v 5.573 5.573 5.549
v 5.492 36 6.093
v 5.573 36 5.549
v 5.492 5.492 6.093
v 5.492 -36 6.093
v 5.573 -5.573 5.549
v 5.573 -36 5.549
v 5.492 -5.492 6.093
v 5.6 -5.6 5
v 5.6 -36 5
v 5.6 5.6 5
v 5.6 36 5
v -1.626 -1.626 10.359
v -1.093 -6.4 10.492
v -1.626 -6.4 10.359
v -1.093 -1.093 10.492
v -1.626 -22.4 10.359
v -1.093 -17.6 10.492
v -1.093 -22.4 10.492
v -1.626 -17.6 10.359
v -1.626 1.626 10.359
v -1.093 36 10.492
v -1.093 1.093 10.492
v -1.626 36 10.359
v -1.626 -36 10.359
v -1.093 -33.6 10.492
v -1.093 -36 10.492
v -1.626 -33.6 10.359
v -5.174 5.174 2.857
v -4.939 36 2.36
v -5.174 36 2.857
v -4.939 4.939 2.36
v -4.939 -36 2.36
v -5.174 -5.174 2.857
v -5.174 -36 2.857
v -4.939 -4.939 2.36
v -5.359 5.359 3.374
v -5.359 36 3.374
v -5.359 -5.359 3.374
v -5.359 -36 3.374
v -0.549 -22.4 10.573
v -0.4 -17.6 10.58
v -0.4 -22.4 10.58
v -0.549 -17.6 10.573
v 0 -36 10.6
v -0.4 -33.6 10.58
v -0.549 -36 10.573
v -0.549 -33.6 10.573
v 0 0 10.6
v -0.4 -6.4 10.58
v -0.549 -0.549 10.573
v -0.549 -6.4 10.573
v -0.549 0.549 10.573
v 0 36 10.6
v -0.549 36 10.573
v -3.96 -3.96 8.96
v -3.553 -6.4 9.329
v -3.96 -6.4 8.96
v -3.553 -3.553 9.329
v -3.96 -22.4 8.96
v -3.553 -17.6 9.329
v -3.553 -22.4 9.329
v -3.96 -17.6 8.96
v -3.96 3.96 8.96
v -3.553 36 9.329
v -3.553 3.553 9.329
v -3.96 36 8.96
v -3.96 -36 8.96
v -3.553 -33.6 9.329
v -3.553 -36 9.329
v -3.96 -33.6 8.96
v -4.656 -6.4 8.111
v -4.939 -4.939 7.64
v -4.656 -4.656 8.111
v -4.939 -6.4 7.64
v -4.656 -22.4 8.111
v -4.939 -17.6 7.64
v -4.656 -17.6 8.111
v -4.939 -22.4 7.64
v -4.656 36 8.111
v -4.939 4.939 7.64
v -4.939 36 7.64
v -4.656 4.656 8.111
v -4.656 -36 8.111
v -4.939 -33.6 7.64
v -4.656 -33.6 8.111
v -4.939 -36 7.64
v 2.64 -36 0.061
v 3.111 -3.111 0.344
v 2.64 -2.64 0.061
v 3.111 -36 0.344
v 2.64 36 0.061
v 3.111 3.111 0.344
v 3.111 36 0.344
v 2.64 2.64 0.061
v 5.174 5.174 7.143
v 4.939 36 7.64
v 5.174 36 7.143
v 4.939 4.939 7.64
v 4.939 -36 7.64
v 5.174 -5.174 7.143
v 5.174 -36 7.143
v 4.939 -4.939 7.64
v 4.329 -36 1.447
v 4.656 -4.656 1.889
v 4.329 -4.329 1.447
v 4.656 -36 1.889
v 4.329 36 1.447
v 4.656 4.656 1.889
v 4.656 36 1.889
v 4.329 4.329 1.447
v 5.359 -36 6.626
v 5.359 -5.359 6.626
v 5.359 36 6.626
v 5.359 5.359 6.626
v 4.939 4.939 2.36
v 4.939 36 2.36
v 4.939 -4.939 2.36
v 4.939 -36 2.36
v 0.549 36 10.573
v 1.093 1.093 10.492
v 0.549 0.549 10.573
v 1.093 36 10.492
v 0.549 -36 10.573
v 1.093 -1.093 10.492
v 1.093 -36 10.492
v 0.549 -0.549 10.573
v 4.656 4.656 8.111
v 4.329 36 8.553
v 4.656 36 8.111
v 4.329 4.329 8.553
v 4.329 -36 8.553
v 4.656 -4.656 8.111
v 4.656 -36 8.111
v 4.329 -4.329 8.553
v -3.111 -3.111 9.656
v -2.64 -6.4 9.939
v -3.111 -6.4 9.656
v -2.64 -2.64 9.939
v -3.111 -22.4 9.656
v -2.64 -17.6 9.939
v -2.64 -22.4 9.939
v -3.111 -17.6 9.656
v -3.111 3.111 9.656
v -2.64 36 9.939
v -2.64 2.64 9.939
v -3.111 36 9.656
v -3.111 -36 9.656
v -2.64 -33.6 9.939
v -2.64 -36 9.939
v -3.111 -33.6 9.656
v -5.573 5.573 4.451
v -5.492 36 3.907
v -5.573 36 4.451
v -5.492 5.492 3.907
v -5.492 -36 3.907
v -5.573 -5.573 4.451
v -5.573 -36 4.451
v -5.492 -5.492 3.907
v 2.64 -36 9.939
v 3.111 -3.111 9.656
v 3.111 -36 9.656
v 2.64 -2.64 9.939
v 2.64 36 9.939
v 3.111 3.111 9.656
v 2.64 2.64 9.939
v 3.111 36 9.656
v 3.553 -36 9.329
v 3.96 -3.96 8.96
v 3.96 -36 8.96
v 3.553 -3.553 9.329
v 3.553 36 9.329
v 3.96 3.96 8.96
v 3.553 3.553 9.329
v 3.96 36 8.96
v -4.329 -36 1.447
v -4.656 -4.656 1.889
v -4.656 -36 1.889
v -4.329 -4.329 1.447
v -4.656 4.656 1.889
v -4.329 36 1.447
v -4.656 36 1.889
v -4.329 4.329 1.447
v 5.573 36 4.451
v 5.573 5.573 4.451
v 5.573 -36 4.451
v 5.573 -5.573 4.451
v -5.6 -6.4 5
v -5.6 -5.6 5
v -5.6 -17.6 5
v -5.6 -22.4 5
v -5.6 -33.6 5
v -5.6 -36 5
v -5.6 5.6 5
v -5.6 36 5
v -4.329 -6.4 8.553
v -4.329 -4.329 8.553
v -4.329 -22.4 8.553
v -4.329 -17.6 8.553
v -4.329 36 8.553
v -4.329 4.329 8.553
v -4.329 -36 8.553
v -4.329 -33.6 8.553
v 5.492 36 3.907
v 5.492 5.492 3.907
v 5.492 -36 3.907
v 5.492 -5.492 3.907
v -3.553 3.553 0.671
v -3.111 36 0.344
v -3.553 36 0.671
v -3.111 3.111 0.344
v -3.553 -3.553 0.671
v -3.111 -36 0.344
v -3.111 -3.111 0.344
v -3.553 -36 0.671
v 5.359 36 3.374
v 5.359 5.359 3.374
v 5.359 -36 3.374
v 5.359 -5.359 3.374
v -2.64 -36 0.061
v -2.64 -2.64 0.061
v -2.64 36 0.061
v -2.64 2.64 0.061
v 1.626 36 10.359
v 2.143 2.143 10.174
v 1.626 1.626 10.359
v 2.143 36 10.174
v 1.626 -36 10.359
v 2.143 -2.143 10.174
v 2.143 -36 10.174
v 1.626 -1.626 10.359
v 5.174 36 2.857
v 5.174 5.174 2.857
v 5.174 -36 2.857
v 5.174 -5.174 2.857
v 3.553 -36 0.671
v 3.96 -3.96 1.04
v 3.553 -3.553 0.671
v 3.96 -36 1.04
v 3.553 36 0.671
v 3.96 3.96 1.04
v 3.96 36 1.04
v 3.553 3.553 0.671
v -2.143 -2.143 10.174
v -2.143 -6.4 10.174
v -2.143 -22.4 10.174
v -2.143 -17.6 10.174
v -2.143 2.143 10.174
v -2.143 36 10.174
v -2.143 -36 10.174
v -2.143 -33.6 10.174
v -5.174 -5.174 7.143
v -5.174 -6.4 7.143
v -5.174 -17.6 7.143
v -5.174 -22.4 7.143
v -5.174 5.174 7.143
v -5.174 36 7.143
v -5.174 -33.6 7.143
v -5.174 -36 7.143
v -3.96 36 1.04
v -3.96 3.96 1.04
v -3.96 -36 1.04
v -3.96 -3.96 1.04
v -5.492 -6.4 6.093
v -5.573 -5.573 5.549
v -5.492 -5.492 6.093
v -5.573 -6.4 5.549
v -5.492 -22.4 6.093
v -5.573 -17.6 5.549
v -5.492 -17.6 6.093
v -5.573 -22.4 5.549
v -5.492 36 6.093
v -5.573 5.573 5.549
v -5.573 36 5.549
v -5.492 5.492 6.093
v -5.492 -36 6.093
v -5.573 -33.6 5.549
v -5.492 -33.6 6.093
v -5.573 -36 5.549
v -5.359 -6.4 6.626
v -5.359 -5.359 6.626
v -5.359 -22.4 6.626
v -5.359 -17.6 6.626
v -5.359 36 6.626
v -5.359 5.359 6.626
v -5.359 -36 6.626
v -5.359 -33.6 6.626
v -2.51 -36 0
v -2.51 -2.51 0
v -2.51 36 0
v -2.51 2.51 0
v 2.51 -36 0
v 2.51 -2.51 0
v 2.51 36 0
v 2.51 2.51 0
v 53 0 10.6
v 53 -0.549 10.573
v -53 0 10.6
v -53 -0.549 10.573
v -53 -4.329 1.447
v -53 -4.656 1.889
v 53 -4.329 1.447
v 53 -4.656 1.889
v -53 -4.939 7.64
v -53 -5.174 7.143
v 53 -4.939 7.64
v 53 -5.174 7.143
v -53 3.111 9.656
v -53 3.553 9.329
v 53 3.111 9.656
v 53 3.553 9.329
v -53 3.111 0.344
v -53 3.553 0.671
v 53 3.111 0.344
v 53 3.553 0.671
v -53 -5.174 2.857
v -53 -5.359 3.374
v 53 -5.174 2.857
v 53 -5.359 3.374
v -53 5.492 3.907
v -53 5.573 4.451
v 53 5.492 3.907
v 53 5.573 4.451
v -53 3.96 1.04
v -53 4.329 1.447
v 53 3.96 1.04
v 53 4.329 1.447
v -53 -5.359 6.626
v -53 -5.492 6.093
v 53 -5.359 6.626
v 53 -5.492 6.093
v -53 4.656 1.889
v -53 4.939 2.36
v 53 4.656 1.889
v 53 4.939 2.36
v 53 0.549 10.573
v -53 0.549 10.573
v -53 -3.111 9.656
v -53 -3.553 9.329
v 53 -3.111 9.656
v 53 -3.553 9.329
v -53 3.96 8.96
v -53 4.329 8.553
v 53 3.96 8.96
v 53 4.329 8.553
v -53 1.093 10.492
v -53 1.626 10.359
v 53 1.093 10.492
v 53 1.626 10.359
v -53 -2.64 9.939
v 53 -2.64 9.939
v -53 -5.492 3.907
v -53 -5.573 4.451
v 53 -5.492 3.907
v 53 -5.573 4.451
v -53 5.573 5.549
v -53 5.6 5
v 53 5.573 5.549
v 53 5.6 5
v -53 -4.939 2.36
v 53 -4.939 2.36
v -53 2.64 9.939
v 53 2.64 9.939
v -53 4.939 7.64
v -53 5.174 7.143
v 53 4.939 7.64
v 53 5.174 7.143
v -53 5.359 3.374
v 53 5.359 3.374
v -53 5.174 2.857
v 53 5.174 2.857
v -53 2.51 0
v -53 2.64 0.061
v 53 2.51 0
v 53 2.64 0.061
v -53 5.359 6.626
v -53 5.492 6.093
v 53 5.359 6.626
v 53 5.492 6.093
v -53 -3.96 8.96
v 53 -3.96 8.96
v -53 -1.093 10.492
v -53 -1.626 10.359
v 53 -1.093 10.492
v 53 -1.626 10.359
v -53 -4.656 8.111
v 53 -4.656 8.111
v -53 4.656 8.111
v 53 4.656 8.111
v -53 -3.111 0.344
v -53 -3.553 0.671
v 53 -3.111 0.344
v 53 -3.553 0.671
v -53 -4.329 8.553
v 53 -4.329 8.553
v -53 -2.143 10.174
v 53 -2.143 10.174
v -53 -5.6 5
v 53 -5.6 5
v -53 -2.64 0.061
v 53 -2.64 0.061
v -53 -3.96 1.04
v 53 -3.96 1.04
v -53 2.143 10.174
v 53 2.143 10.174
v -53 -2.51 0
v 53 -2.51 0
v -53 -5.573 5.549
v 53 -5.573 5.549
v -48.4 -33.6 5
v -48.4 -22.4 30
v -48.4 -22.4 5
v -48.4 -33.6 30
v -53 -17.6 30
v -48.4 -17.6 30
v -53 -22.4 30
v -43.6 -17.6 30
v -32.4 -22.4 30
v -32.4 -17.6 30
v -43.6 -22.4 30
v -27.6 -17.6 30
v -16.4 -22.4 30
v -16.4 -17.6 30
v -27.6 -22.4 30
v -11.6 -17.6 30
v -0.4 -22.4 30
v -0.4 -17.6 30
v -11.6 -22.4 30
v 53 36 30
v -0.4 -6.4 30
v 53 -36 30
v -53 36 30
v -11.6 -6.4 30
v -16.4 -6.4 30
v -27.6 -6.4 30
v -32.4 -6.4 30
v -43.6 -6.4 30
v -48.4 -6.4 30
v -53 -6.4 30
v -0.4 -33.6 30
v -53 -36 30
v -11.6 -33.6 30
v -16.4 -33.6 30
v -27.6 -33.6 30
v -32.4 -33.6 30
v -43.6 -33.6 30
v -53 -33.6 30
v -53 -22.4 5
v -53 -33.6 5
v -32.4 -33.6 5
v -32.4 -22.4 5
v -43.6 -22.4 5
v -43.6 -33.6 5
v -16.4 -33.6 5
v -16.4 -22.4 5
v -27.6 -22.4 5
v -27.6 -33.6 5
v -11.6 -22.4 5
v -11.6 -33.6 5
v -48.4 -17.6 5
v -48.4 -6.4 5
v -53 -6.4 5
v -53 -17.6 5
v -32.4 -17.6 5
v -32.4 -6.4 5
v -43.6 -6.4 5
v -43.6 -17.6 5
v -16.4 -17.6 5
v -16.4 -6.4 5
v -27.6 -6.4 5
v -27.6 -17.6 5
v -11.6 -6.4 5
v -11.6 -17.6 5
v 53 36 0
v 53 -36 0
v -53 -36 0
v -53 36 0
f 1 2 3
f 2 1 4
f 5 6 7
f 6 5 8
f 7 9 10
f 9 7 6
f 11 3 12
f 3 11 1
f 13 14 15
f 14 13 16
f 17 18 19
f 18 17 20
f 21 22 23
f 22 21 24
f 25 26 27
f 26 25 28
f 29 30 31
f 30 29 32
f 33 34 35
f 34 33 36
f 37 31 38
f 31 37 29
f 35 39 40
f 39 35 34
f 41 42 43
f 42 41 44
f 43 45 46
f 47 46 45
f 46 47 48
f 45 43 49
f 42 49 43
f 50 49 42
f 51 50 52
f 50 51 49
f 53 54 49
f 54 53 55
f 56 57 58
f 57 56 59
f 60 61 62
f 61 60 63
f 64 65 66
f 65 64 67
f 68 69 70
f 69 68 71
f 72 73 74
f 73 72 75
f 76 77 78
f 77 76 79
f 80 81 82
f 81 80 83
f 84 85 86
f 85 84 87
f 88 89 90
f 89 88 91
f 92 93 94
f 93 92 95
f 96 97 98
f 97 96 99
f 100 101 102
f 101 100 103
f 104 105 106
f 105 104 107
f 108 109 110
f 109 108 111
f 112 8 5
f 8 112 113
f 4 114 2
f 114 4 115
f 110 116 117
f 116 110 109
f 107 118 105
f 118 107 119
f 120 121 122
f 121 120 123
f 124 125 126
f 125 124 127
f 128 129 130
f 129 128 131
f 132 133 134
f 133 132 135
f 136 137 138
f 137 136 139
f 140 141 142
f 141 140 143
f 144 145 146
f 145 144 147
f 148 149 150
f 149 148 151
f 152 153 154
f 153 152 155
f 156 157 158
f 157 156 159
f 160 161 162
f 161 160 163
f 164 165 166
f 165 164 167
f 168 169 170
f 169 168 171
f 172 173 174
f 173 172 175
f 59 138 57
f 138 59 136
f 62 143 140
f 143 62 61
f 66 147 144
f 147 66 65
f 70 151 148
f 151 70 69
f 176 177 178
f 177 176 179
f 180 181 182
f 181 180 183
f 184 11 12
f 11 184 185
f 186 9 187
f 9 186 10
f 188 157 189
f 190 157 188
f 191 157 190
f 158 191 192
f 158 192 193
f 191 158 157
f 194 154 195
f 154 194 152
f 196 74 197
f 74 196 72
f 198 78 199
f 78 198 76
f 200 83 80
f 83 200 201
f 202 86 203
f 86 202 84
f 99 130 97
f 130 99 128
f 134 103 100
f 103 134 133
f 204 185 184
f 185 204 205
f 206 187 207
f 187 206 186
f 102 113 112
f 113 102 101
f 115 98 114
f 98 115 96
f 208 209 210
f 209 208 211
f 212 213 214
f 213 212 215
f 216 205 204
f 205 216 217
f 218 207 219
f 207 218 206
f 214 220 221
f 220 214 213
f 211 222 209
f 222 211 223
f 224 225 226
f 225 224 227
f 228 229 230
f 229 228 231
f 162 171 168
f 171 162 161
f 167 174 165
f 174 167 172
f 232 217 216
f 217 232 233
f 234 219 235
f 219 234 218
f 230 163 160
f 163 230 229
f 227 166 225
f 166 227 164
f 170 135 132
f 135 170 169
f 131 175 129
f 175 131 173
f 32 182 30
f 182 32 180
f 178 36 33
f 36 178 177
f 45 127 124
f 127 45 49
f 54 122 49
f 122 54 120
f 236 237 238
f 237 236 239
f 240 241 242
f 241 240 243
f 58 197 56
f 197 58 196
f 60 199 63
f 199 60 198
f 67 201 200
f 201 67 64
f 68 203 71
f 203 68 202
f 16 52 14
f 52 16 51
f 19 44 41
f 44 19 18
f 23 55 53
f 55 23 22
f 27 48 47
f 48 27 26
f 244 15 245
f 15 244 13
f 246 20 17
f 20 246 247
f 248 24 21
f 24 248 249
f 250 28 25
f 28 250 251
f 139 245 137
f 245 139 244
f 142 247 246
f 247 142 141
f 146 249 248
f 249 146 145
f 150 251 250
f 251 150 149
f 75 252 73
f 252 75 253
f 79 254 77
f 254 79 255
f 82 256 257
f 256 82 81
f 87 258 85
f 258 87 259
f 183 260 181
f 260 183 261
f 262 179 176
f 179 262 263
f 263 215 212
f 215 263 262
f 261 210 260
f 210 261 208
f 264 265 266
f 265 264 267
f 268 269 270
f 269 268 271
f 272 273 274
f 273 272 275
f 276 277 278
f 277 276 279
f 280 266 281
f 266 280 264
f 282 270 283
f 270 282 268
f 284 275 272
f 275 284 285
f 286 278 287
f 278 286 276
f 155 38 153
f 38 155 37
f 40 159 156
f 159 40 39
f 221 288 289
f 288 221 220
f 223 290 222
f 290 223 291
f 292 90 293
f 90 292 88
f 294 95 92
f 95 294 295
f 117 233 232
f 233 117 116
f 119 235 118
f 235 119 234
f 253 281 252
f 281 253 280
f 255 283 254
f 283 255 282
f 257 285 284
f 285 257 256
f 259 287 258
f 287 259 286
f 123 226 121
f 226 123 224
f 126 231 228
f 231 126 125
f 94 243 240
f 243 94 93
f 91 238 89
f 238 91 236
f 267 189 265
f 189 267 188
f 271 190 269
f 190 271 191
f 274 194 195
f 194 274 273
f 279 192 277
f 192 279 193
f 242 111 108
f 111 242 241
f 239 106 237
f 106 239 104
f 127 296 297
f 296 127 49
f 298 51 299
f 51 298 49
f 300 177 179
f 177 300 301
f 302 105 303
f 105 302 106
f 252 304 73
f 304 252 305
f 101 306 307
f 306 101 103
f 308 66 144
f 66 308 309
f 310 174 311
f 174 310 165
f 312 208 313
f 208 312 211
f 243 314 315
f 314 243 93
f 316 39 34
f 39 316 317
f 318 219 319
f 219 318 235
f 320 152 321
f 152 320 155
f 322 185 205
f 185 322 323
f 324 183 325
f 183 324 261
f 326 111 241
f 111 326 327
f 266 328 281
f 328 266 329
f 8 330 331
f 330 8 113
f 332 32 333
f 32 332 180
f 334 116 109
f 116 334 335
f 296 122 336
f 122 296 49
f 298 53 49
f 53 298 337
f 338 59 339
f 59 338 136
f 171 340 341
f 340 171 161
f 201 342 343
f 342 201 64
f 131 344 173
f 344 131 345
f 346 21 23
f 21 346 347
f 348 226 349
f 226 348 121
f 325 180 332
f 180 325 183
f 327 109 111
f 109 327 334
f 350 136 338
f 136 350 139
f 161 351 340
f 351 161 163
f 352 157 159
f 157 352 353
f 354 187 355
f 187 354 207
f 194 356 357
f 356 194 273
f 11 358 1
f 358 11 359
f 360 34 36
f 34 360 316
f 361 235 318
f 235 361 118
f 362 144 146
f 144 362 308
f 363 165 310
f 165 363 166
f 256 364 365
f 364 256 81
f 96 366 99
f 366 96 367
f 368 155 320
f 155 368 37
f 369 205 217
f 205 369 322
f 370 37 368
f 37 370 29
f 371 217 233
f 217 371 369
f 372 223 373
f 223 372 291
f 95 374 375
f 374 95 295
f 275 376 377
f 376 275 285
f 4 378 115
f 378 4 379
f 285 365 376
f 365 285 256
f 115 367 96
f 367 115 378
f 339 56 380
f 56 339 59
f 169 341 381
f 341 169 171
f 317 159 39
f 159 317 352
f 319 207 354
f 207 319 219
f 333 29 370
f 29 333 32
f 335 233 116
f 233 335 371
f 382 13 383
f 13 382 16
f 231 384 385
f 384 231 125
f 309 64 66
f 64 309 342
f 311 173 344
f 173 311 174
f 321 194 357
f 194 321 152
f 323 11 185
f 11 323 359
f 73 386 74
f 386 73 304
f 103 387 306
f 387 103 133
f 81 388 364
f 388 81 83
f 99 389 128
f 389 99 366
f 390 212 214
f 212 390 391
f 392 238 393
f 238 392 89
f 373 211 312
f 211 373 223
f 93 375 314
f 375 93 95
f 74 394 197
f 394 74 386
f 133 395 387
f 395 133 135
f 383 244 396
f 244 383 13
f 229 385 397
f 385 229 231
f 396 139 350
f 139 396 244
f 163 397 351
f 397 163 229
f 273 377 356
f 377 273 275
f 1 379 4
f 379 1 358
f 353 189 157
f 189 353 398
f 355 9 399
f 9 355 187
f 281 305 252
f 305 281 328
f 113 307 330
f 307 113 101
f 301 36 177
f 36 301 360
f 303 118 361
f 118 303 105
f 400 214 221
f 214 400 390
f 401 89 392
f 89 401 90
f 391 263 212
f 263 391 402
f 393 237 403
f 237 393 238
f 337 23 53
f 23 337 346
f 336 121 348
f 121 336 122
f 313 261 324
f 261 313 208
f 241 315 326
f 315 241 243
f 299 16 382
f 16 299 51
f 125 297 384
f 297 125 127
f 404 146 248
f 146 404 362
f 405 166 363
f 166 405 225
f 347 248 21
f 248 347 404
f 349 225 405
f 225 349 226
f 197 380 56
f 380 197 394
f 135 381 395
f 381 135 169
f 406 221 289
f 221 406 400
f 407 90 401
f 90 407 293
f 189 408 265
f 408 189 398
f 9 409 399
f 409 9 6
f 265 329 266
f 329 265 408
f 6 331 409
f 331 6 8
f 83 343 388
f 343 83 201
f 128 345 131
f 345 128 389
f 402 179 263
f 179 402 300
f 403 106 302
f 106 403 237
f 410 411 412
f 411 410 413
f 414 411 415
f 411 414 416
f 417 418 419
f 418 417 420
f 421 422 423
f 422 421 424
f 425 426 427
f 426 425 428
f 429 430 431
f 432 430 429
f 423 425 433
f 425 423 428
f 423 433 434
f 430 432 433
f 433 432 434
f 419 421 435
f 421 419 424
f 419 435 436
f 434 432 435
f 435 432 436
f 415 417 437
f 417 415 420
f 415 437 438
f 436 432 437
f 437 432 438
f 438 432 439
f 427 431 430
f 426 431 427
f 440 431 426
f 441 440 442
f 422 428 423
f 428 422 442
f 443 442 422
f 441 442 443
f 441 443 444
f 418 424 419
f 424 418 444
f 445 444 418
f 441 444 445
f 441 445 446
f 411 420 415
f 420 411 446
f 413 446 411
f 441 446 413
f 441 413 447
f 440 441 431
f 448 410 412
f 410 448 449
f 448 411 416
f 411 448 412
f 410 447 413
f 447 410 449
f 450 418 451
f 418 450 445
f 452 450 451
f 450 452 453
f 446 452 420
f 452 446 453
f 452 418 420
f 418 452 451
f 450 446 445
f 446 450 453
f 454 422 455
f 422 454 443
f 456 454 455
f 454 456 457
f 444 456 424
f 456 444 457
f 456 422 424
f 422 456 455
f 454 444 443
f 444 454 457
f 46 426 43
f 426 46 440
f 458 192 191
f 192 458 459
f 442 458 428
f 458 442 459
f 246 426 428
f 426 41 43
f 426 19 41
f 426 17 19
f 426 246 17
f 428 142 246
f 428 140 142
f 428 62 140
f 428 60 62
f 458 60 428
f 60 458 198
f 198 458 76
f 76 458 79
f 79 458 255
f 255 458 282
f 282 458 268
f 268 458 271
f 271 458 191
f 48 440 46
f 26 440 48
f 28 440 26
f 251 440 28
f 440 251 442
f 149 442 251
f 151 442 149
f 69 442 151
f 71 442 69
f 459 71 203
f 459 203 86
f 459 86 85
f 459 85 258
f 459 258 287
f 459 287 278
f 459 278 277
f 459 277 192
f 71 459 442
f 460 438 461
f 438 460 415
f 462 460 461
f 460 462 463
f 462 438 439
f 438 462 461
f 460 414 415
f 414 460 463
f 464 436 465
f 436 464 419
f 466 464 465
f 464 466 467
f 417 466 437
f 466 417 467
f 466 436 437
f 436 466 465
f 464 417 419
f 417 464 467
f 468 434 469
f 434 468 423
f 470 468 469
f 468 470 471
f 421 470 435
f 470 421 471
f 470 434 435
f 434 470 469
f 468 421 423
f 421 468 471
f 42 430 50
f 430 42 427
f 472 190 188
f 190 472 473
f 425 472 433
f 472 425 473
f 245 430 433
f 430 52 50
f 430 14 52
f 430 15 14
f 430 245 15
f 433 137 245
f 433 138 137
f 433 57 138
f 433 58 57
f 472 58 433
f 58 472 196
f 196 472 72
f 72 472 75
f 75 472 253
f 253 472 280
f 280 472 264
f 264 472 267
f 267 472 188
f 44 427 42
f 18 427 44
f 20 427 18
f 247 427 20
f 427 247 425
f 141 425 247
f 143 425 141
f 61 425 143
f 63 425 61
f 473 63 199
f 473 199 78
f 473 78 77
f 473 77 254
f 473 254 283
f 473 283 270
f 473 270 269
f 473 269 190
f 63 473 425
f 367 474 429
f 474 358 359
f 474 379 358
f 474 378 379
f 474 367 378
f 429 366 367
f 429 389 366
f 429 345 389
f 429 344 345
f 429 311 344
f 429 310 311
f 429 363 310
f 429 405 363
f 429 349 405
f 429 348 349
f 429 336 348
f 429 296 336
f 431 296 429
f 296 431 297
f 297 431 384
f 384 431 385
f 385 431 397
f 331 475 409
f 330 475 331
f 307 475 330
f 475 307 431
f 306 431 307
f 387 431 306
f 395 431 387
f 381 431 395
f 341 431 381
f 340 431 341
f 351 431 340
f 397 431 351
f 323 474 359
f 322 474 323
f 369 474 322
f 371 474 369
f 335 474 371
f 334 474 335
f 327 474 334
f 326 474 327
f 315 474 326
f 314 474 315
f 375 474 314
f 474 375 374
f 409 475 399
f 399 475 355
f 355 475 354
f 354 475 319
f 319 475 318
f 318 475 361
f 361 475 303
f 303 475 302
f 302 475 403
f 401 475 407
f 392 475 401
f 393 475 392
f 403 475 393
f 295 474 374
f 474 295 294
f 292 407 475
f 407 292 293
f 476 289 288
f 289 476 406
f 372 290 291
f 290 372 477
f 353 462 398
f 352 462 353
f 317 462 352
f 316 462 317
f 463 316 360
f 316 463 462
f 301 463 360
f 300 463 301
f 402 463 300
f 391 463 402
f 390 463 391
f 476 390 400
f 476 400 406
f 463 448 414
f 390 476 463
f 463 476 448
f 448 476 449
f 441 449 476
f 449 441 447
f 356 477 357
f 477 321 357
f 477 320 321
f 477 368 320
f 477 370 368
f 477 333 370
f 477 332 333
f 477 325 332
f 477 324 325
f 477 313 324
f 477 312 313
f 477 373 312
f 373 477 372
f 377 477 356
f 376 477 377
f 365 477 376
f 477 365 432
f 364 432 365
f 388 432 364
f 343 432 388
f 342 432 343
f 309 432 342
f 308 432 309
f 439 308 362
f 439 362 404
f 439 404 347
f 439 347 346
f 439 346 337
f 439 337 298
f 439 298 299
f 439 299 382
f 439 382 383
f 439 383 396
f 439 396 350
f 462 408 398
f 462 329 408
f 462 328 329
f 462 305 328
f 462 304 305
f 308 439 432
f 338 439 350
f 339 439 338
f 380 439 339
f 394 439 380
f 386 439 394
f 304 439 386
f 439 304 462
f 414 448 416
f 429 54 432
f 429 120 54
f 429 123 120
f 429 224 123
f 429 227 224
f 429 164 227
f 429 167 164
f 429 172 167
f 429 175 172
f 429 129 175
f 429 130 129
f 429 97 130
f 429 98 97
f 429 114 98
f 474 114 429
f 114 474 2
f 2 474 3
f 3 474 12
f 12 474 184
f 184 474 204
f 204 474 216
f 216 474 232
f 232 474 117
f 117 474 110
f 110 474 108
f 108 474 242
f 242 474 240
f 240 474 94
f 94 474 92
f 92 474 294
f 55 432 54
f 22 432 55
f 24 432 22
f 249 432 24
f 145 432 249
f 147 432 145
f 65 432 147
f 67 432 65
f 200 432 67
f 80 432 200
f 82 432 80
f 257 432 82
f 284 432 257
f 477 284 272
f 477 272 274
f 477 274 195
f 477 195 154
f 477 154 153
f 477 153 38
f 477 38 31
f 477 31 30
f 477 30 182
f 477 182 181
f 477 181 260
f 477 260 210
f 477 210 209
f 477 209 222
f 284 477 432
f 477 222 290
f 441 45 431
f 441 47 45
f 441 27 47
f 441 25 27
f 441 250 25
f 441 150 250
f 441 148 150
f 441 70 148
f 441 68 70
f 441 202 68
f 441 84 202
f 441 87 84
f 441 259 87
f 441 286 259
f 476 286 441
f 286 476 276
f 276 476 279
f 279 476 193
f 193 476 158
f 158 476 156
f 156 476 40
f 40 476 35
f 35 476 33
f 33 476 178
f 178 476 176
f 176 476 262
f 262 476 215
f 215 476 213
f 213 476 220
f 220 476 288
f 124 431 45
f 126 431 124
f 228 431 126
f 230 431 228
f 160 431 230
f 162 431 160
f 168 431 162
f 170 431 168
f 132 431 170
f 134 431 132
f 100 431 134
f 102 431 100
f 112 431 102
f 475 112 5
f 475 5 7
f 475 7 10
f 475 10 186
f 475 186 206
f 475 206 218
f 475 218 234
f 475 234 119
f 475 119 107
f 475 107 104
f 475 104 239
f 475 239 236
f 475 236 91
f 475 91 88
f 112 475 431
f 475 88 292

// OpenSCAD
// Built by bench/smallmodels/features/compiler.py from a list of features.
$fn = 64;
difference() {
  union() {
    translate([0, 0, 0]) translate([-53, -36, 0]) cube([106, 72, 30]);
  }
  union() {
    translate([0, 0, 5]) rotate([0, 0, 0]) rotate([90, 0, 0]) cylinder(d = 11.2, h = 1120, center = true);
    translate([0, 0, 5]) rotate([0, 0, 0]) rotate([0, 90, 0]) cylinder(d = 11.2, h = 1120, center = true);
    translate([-86, -60, 5]) rotate([0, 0, 0]) translate([-5.6, -5.6, 0]) cube([11.2, 11.2, 25]);
    translate([-70, -60, 5]) rotate([0, 0, 0]) translate([-5.6, -5.6, 0]) cube([11.2, 11.2, 25]);
    translate([-54, -60, 5]) rotate([0, 0, 0]) translate([-5.6, -5.6, 0]) cube([11.2, 11.2, 25]);
    translate([-38, -60, 5]) rotate([0, 0, 0]) translate([-5.6, -5.6, 0]) cube([11.2, 11.2, 25]);
    translate([-22, -60, 5]) rotate([0, 0, 0]) translate([-5.6, -5.6, 0]) cube([11.2, 11.2, 25]);
    translate([-6, -60, 5]) rotate([0, 0, 0]) translate([-5.6, -5.6, 0]) cube([11.2, 11.2, 25]);
    translate([-86, -44, 5]) rotate([0, 0, 0]) translate([-5.6, -5.6, 0]) cube([11.2, 11.2, 25]);
    translate([-70, -44, 5]) rotate([0, 0, 0]) translate([-5.6, -5.6, 0]) cube([11.2, 11.2, 25]);
    translate([-54, -44, 5]) rotate([0, 0, 0]) translate([-5.6, -5.6, 0]) cube([11.2, 11.2, 25]);
    translate([-38, -44, 5]) rotate([0, 0, 0]) translate([-5.6, -5.6, 0]) cube([11.2, 11.2, 25]);
    translate([-22, -44, 5]) rotate([0, 0, 0]) translate([-5.6, -5.6, 0]) cube([11.2, 11.2, 25]);
    translate([-6, -44, 5]) rotate([0, 0, 0]) translate([-5.6, -5.6, 0]) cube([11.2, 11.2, 25]);
    translate([-86, -28, 5]) rotate([0, 0, 0]) translate([-5.6, -5.6, 0]) cube([11.2, 11.2, 25]);
    translate([-70, -28, 5]) rotate([0, 0, 0]) translate([-5.6, -5.6, 0]) cube([11.2, 11.2, 25]);
    translate([-54, -28, 5]) rotate([0, 0, 0]) translate([-5.6, -5.6, 0]) cube([11.2, 11.2, 25]);
    translate([-38, -28, 5]) rotate([0, 0, 0]) translate([-5.6, -5.6, 0]) cube([11.2, 11.2, 25]);
    translate([-22, -28, 5]) rotate([0, 0, 0]) translate([-5.6, -5.6, 0]) cube([11.2, 11.2, 25]);
    translate([-6, -28, 5]) rotate([0, 0, 0]) translate([-5.6, -5.6, 0]) cube([11.2, 11.2, 25]);
    translate([-86, -12, 5]) rotate([0, 0, 0]) translate([-5.6, -5.6, 0]) cube([11.2, 11.2, 25]);
    translate([-70, -12, 5]) rotate([0, 0, 0]) translate([-5.6, -5.6, 0]) cube([11.2, 11.2, 25]);
    translate([-54, -12, 5]) rotate([0, 0, 0]) translate([-5.6, -5.6, 0]) cube([11.2, 11.2, 25]);
    translate([-38, -12, 5]) rotate([0, 0, 0]) translate([-5.6, -5.6, 0]) cube([11.2, 11.2, 25]);
    translate([-22, -12, 5]) rotate([0, 0, 0]) translate([-5.6, -5.6, 0]) cube([11.2, 11.2, 25]);
    translate([-6, -12, 5]) rotate([0, 0, 0]) translate([-5.6, -5.6, 0]) cube([11.2, 11.2, 25]);
  }
}
